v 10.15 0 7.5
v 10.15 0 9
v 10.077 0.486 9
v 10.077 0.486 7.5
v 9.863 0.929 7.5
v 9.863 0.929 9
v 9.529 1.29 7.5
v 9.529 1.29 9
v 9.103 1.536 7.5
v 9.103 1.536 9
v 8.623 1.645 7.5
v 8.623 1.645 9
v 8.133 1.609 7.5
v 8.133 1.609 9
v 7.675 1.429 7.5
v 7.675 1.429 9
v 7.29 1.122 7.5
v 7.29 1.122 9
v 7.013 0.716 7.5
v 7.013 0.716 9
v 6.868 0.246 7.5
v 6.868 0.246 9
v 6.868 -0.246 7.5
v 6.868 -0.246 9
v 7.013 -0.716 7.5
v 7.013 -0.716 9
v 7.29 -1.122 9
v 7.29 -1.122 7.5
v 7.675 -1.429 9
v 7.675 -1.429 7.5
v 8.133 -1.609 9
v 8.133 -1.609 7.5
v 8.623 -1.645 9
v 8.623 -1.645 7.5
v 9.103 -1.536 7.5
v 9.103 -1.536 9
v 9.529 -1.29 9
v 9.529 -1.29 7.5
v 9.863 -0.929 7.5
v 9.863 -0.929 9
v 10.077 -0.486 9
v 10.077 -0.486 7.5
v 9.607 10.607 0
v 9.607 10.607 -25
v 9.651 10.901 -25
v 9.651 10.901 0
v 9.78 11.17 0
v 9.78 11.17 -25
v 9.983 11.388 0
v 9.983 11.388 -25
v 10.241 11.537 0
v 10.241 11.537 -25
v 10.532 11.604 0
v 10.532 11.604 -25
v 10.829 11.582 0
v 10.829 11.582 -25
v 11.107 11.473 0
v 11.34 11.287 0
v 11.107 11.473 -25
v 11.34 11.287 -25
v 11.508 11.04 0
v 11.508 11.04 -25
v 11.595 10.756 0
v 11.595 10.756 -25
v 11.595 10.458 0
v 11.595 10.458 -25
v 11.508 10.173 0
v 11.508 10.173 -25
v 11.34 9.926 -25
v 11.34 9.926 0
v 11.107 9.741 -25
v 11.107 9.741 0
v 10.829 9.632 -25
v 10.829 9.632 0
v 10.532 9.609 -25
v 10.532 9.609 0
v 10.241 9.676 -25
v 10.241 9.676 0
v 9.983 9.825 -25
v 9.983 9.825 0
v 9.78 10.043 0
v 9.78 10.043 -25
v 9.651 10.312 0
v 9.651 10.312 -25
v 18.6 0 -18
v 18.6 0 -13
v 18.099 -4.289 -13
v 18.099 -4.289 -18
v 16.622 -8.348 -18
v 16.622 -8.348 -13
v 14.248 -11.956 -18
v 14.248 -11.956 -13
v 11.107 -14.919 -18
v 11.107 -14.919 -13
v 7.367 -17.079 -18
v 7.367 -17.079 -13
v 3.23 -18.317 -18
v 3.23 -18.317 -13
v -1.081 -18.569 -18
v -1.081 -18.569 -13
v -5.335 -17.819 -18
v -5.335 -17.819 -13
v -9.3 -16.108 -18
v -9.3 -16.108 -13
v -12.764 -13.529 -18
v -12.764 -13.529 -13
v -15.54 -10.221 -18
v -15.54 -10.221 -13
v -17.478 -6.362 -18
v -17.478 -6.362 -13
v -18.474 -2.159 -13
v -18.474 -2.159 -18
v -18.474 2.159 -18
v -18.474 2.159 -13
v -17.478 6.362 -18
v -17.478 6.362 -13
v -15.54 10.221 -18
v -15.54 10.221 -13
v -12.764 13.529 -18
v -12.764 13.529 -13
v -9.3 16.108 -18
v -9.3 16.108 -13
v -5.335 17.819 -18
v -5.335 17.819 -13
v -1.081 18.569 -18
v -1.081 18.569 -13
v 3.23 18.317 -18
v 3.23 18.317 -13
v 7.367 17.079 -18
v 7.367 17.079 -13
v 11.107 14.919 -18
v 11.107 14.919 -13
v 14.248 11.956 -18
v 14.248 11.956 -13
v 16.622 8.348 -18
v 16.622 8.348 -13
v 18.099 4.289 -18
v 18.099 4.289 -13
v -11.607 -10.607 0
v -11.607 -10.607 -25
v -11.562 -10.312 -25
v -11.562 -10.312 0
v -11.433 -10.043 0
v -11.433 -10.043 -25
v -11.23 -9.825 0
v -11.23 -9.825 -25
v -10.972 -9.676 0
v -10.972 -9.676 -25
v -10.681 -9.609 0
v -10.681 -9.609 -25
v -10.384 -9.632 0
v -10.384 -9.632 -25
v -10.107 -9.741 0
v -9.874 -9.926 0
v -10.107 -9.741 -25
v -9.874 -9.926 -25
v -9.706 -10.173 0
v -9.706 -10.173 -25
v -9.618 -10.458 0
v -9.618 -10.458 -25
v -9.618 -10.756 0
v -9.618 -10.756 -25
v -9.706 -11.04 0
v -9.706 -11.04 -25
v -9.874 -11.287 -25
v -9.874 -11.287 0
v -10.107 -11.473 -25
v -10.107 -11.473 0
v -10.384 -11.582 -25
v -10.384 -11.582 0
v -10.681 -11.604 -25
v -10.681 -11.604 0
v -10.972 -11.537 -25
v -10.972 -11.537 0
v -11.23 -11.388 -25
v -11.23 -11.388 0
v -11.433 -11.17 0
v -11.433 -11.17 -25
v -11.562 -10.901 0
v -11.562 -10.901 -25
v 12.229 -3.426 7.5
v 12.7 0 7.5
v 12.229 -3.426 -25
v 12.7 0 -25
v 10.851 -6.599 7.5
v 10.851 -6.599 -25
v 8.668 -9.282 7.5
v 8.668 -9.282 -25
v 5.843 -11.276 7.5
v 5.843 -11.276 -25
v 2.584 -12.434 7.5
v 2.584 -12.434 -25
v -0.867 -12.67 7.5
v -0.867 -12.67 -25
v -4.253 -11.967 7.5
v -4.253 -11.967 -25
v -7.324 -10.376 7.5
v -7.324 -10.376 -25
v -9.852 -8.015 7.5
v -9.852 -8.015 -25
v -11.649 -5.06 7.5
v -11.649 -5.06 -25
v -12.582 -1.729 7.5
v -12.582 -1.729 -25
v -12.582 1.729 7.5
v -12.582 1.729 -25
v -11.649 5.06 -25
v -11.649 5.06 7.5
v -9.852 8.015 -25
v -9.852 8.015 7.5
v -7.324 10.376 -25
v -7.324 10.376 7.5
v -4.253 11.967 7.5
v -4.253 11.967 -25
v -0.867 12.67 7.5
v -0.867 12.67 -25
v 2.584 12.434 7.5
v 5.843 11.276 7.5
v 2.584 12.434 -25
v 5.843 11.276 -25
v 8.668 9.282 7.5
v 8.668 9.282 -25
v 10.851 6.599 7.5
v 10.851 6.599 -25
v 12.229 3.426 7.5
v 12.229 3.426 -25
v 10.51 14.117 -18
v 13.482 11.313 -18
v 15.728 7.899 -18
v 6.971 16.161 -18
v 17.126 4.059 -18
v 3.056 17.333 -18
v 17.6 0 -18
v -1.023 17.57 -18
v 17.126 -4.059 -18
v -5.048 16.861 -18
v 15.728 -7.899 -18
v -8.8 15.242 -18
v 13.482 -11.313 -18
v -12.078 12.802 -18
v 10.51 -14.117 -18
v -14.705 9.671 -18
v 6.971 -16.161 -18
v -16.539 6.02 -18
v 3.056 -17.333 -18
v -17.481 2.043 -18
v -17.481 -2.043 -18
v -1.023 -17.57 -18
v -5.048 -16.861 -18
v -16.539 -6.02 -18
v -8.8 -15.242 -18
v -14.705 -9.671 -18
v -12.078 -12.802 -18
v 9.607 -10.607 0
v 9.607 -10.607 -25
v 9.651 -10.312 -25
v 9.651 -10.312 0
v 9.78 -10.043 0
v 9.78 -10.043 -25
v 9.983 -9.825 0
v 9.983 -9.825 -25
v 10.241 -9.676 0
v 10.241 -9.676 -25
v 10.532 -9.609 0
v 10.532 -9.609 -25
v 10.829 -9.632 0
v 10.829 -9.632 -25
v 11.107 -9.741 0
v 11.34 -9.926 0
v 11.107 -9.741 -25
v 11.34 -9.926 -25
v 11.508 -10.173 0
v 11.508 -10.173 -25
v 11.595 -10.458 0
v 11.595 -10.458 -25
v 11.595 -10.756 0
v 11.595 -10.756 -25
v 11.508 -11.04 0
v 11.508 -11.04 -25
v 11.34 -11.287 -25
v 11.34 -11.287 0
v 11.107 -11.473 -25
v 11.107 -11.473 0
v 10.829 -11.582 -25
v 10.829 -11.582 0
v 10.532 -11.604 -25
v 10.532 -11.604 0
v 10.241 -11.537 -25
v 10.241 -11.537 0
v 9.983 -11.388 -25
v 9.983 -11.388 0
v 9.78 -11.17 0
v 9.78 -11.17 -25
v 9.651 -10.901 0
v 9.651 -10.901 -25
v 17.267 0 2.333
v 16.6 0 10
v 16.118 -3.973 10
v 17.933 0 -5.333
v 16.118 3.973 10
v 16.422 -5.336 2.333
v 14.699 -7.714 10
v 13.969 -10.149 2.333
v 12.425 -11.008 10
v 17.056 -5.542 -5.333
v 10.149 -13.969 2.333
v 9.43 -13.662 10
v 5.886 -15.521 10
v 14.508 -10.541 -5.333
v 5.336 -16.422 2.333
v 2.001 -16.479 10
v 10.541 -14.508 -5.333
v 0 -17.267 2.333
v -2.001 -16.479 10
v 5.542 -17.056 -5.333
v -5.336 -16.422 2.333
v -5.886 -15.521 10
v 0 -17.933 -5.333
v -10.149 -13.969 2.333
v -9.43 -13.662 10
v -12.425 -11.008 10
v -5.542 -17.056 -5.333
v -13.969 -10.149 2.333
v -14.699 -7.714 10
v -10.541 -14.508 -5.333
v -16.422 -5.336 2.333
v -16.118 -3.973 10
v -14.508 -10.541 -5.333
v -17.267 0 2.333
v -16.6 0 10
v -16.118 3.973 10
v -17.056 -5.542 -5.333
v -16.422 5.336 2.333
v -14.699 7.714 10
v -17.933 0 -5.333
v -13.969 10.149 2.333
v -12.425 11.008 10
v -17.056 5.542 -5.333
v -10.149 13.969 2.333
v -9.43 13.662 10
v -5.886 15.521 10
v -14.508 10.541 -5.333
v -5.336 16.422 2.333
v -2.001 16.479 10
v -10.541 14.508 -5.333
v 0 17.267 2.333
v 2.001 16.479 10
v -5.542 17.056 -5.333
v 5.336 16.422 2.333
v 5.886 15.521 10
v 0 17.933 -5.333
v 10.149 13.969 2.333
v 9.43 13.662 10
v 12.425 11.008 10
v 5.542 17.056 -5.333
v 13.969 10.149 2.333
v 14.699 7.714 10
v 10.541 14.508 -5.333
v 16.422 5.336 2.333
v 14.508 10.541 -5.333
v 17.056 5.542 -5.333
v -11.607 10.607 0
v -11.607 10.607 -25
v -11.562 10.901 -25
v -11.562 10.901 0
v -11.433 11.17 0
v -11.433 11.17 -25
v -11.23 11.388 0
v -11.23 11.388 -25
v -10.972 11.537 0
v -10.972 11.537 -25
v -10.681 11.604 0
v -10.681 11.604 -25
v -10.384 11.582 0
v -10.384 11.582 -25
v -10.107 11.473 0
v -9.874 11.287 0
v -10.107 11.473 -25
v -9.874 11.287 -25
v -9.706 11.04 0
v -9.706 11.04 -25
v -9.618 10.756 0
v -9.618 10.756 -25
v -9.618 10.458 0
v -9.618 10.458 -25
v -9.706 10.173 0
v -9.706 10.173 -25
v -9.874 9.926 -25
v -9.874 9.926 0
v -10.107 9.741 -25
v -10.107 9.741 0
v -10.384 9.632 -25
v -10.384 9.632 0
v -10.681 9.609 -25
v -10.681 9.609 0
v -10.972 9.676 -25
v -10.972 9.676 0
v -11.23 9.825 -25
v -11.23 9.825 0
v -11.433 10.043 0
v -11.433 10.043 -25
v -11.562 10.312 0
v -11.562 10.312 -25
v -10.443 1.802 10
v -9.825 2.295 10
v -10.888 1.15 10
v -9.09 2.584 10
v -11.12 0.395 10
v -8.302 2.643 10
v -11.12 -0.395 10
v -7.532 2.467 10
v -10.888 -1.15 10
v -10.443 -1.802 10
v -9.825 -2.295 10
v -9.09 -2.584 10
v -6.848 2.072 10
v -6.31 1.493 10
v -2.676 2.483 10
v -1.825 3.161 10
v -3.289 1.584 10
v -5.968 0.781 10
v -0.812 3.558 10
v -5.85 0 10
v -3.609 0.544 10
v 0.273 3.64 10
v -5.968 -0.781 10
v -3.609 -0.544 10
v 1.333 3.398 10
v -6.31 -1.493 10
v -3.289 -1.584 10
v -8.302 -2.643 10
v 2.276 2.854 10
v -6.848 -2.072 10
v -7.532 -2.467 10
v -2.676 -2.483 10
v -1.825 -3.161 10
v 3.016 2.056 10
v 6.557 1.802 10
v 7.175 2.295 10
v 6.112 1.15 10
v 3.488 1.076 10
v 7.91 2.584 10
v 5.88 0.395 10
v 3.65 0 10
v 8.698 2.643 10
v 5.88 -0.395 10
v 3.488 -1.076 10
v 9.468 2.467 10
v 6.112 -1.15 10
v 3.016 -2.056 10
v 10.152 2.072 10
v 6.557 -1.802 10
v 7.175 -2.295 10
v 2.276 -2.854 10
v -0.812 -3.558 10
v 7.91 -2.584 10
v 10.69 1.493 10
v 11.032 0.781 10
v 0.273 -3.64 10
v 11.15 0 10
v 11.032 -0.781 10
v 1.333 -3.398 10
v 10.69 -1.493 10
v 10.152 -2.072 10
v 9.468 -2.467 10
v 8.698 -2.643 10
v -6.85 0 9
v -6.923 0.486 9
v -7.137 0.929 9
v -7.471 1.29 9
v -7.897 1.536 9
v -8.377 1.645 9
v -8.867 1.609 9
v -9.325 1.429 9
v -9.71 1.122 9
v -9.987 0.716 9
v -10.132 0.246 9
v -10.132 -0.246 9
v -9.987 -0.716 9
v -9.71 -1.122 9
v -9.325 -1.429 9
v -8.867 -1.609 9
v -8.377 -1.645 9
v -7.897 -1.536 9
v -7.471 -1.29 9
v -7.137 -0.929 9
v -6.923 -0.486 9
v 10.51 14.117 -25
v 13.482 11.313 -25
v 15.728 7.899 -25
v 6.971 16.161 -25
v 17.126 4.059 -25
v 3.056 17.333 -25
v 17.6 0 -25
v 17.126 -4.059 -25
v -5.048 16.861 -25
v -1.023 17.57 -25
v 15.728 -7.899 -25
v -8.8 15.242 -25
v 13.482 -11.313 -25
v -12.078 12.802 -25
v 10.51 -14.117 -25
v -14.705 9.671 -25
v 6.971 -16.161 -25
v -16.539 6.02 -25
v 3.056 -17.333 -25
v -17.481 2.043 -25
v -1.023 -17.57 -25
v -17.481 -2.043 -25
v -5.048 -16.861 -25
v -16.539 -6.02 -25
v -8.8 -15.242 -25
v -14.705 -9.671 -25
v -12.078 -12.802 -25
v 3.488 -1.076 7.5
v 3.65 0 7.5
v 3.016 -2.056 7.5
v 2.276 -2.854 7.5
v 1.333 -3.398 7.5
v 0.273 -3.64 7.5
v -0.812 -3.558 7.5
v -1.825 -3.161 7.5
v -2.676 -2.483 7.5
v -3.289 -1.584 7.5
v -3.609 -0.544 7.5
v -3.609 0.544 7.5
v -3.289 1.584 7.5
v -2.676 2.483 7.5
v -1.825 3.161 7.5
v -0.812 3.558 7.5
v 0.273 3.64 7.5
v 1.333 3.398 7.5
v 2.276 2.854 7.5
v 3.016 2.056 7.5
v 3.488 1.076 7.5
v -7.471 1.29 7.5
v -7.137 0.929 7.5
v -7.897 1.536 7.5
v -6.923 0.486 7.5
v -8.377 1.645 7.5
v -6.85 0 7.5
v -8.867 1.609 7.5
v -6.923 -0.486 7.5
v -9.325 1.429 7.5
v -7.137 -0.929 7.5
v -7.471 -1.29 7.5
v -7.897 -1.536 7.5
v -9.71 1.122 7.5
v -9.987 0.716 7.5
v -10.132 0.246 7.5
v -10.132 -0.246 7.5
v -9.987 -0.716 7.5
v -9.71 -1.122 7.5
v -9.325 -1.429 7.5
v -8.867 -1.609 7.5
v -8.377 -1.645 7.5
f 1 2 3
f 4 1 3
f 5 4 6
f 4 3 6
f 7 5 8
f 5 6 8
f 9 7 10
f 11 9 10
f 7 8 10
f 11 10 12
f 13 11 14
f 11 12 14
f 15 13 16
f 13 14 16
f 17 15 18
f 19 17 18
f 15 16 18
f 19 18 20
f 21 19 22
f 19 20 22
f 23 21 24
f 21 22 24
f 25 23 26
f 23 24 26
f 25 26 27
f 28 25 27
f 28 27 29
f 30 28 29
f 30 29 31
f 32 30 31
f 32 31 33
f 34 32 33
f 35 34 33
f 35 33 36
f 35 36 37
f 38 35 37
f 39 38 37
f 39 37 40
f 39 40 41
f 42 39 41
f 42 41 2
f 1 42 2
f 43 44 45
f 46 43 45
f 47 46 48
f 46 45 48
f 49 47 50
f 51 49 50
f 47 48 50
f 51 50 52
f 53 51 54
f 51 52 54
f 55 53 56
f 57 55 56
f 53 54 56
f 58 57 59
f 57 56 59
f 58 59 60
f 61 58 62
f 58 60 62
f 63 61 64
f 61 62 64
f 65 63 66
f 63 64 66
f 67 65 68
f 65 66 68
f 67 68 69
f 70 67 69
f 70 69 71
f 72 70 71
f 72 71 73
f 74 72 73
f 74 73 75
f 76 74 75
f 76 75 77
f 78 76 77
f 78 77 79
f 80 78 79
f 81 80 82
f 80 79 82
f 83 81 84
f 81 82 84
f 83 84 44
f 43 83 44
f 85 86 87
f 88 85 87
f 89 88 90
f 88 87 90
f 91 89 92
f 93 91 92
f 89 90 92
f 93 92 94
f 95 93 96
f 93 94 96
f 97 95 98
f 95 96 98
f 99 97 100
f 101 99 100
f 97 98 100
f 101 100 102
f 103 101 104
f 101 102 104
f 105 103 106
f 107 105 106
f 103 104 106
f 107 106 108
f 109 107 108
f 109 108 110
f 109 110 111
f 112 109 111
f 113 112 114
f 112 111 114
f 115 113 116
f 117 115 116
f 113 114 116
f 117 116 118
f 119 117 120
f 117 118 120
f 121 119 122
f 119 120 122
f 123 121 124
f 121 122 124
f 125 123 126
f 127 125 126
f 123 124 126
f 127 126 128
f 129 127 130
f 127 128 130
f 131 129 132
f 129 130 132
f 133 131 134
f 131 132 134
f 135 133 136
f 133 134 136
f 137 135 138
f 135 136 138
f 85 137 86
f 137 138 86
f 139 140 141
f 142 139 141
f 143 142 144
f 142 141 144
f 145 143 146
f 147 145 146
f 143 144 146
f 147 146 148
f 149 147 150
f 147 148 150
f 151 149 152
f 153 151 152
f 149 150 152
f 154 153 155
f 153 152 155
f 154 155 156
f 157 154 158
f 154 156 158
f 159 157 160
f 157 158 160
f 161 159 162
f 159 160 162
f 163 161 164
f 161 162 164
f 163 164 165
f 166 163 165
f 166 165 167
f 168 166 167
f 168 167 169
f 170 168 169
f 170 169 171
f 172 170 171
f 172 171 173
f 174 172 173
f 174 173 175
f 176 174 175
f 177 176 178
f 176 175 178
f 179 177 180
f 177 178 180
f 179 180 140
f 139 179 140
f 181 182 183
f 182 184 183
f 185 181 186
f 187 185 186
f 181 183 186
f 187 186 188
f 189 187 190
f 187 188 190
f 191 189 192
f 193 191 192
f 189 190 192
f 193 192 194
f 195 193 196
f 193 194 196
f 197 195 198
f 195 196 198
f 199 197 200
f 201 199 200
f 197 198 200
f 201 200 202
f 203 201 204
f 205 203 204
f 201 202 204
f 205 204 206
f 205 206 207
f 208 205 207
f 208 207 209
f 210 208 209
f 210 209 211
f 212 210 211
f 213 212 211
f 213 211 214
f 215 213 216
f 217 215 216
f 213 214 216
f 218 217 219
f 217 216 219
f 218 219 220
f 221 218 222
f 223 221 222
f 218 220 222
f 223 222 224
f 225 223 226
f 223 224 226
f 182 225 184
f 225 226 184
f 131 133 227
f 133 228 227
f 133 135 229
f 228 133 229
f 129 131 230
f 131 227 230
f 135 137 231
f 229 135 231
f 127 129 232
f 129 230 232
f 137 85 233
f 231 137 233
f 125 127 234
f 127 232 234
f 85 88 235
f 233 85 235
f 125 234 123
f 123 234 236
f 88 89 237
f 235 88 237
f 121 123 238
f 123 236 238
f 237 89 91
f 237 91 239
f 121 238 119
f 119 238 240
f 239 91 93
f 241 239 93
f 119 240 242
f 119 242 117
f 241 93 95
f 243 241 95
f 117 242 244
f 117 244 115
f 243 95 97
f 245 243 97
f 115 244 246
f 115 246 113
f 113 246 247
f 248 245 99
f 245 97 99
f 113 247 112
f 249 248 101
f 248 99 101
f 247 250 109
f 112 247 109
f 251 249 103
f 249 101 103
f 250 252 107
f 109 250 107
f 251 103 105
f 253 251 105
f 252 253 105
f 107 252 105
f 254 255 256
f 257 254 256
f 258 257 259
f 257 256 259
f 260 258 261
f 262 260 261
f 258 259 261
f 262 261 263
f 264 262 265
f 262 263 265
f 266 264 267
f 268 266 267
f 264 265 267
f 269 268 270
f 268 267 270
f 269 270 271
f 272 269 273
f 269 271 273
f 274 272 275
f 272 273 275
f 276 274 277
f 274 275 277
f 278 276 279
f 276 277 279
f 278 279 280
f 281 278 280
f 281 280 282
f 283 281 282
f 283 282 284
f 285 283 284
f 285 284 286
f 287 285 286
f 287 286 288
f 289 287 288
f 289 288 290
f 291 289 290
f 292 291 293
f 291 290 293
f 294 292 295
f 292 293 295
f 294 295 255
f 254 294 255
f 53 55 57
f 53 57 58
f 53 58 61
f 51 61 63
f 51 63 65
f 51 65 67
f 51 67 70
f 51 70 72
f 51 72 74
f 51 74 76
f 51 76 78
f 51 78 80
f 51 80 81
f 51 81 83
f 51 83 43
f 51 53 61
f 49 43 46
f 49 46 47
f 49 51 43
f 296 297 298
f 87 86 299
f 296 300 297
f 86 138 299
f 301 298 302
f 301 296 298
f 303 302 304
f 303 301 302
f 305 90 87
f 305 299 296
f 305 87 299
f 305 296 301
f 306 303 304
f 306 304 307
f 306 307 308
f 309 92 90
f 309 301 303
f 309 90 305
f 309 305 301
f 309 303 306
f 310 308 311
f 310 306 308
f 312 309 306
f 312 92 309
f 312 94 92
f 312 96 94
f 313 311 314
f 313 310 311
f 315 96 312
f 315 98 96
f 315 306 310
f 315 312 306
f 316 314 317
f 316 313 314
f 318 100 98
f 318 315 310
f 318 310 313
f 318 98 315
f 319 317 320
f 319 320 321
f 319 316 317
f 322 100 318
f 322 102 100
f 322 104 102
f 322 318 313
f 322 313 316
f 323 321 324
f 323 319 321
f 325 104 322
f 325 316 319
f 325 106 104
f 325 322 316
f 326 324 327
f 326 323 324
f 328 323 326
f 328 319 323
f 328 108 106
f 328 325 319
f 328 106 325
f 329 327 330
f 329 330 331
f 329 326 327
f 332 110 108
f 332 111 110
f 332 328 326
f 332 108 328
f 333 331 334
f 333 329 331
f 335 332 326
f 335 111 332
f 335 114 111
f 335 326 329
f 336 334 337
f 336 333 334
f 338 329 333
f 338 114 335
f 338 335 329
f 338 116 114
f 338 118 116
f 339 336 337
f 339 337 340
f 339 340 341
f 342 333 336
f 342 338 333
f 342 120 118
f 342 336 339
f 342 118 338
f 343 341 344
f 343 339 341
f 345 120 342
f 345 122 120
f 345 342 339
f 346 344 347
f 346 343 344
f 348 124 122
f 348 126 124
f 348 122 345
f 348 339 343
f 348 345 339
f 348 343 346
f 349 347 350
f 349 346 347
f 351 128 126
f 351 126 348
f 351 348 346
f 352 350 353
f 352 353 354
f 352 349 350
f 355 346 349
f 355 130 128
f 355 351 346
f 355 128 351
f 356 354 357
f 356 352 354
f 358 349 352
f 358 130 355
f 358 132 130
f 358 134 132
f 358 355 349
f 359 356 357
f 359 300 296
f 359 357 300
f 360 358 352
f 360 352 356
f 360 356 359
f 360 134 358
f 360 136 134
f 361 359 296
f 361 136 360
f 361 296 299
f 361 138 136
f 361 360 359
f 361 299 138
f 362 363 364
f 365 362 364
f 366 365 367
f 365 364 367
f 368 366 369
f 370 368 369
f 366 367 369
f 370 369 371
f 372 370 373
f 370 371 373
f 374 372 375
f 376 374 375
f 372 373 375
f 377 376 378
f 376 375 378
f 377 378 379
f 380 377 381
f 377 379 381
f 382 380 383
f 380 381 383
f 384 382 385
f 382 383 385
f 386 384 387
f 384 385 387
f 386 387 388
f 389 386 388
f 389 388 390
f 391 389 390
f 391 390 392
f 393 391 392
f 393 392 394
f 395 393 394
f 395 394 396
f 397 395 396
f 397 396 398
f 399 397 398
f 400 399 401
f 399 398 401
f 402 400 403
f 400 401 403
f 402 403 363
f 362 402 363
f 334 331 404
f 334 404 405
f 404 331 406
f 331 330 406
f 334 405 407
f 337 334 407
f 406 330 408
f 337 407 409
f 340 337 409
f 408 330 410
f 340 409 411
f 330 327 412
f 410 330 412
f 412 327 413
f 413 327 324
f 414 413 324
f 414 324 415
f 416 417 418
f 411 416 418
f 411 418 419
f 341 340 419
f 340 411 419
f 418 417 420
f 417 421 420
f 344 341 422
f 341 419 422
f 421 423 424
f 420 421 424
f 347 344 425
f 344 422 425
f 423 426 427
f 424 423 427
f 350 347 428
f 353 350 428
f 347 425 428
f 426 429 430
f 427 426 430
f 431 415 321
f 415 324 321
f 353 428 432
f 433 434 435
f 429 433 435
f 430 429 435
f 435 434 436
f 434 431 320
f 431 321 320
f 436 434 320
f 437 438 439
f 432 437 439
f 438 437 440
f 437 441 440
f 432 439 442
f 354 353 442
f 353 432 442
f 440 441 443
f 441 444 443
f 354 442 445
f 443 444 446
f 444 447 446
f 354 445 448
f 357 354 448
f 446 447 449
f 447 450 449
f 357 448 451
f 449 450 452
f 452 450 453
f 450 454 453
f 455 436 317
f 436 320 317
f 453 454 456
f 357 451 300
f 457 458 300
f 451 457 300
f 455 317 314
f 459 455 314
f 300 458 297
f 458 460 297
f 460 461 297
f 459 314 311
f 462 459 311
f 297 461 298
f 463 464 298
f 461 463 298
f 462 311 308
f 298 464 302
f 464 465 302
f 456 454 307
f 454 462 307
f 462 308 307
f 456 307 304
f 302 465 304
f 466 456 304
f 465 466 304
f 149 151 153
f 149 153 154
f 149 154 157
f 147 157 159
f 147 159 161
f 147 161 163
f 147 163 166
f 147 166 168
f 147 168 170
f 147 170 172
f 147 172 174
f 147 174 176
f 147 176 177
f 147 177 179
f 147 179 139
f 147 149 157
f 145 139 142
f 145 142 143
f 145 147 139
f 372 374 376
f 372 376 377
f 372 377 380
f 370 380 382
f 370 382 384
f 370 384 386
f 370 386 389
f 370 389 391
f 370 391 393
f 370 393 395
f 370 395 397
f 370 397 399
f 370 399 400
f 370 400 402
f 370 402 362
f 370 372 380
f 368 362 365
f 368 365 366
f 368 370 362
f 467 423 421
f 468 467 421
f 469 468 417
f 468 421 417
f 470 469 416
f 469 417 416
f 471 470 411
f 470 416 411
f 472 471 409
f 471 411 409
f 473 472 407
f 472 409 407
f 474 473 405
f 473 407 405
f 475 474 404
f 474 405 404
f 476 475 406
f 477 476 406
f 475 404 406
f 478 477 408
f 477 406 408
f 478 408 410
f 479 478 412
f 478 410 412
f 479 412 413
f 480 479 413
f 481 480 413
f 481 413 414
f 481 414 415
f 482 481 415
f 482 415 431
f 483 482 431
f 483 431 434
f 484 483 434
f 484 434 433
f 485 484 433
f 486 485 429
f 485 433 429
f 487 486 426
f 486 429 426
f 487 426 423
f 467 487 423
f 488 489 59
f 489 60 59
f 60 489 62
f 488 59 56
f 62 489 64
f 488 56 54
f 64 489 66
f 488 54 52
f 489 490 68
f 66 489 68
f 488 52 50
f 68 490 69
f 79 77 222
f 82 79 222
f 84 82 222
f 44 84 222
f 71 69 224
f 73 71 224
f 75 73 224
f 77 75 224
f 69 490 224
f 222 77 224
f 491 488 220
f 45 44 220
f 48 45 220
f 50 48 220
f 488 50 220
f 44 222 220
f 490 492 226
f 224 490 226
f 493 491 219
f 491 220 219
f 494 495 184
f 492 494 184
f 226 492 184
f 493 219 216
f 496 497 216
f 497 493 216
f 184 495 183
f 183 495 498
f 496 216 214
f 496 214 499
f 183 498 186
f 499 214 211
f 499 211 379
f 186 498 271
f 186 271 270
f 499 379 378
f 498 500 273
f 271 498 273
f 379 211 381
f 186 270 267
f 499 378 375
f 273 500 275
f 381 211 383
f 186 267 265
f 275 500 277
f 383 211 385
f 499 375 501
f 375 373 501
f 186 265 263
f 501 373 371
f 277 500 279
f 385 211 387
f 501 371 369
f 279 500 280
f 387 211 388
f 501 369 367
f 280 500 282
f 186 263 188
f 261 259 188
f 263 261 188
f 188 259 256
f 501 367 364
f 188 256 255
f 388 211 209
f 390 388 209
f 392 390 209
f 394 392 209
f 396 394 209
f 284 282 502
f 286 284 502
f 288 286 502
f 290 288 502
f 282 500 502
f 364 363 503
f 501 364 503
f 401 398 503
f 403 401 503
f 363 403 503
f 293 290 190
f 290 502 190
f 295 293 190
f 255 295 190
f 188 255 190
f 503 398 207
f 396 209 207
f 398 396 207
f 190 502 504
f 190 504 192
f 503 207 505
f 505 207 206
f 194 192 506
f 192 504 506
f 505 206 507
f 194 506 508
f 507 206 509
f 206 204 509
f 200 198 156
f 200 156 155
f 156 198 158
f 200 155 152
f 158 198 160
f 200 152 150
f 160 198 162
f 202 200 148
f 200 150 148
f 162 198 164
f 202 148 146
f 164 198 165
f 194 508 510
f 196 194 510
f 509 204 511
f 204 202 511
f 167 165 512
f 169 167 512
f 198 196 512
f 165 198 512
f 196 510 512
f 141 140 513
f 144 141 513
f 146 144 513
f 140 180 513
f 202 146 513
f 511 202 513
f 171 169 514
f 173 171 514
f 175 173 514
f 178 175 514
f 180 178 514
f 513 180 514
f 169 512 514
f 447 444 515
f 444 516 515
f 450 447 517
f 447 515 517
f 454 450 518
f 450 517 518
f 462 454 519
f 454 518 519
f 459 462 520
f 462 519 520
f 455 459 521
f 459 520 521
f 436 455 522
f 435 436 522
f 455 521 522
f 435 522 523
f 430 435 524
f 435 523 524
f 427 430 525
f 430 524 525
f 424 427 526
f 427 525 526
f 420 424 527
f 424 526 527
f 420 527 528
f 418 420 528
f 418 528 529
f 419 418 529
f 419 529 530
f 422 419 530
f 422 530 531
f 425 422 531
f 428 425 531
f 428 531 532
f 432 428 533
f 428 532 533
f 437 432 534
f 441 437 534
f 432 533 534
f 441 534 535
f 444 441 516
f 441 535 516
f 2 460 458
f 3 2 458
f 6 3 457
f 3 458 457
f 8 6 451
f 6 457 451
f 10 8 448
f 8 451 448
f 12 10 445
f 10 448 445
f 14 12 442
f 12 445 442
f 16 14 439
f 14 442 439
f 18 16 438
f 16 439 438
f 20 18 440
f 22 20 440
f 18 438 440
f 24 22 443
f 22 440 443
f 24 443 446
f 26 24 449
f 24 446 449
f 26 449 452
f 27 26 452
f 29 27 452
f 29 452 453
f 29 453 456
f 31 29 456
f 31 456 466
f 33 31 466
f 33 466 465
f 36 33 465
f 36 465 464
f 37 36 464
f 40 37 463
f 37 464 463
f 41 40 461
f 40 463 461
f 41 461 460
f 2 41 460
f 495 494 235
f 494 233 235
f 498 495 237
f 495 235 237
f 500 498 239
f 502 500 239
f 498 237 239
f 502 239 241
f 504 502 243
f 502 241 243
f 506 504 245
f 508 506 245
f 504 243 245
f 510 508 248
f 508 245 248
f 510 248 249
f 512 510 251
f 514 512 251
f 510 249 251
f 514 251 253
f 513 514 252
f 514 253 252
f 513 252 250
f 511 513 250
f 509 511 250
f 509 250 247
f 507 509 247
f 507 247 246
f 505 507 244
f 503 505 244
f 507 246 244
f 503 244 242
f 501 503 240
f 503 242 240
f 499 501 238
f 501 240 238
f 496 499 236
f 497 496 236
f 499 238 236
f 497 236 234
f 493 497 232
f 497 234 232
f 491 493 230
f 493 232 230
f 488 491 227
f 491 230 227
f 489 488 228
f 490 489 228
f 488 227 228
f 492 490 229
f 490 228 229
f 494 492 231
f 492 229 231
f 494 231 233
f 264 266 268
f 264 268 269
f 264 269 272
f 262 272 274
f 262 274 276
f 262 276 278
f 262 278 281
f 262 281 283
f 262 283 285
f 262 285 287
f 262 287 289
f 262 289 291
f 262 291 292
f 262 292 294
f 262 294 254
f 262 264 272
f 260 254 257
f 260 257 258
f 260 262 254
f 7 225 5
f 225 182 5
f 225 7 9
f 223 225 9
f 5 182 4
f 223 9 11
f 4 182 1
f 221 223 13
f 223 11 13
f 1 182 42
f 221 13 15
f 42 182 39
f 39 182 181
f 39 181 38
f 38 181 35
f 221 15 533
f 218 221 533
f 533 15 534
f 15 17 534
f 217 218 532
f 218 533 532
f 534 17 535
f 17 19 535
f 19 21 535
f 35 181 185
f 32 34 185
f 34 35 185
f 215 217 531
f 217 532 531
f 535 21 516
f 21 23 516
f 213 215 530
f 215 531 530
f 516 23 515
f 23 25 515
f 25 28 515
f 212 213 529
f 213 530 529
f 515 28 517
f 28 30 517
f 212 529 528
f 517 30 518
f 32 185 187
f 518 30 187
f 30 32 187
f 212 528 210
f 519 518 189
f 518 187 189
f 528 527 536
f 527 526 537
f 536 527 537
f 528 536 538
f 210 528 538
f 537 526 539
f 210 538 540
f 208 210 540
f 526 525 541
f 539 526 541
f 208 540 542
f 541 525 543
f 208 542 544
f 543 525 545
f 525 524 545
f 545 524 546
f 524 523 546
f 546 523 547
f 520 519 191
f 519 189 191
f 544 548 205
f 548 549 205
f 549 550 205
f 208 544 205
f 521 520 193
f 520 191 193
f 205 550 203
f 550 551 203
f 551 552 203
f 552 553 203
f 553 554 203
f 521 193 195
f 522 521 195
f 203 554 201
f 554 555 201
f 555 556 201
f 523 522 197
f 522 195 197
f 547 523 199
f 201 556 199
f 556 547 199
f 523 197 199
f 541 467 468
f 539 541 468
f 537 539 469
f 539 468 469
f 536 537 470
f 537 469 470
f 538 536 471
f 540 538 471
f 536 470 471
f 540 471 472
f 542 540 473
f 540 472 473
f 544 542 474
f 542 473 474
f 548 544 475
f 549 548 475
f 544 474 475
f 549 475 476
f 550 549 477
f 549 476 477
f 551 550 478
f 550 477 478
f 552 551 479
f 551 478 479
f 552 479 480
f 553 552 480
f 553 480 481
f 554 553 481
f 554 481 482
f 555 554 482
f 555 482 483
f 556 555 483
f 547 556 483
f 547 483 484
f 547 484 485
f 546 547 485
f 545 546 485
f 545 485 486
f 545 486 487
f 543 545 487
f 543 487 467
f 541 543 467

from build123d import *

# Parameters (mm, degrees)
SKETCH2_R              = 1.65
CUT_EXTRUDE_3_6_DEPTH  = 4.5
CHAMFER_1_SIZE         = 1
SKETCH3_R              = 1
CUT_EXTRUDE_3_20_DEPTH = 25


with BuildPart() as part:
    # Sketch1 → Revolve 696 (revolve)
    with BuildSketch(Plane(origin=(0, 0, 0), x_dir=(0, 0, -1), z_dir=(1, 0, 0)), mode=Mode.PRIVATE) as revolve_696_sk:
        Polygon((-7.5, 12.7), (25, 12.7), (25, 17.6), (18, 17.6), (18, 18.6), (-10, 18.6), (-10, 3.65), (-7.5, 3.65), align=None)
    revolve(revolve_696_sk.sketch.rotate(Axis((0, 0, 0), (0, 0, -1)), 90), axis=Axis((0, 0, 0), (0, 0, -1)))

    # Sketch2 → Крепление к двигателю (винт с потайной головкой М3х6) (cut)
    with BuildSketch(Plane.XY.offset(10)):
        with Locations((8.5, 0)):
            Circle(SKETCH2_R)
        with Locations((-8.5, 0)):
            Circle(SKETCH2_R)
    extrude(amount=-CUT_EXTRUDE_3_6_DEPTH, mode=Mode.SUBTRACT)

    # Фаска 1
    chamfer_1_edges = [part.edges().sort_by_distance(p)[0] for p in [
        (6.85, 0, 10),
        (-10.15, 0, 10),
    ]]
    chamfer(chamfer_1_edges, length=CHAMFER_1_SIZE)

    # Sketch3 → Отверстие под саморез М3х20 (cut)
    with BuildSketch(Plane(origin=(0, 0, -25), x_dir=(-1, 0, 0), z_dir=(0, 0, -1))):
        with Locations((-10.606601718, 10.606601718)):
            Circle(SKETCH3_R)
        with Locations((10.606601718, 10.606601718)):
            Circle(SKETCH3_R)
        with Locations((10.606601718, -10.606601718)):
            Circle(SKETCH3_R)
        with Locations((-10.606601718, -10.606601718)):
            Circle(SKETCH3_R)
    extrude(amount=-CUT_EXTRUDE_3_20_DEPTH, mode=Mode.SUBTRACT)

    # Эскиз2 → Cut-Revolve 1559 (revolve, cut)
    with BuildSketch(Plane(origin=(0, 0, 0), x_dir=(0, 0, -1), z_dir=(1, 0, 0)), mode=Mode.PRIVATE) as cut_revolve_1559_sk:
        Polygon((-10, 18.6), (-10, 16.6), (13, 18.6), align=None)
    revolve(cut_revolve_1559_sk.sketch.rotate(Axis((0, 0, 10), (0, 0, -1)), 90), axis=Axis((0, 0, 10), (0, 0, -1)), mode=Mode.SUBTRACT)


solid = part.part
